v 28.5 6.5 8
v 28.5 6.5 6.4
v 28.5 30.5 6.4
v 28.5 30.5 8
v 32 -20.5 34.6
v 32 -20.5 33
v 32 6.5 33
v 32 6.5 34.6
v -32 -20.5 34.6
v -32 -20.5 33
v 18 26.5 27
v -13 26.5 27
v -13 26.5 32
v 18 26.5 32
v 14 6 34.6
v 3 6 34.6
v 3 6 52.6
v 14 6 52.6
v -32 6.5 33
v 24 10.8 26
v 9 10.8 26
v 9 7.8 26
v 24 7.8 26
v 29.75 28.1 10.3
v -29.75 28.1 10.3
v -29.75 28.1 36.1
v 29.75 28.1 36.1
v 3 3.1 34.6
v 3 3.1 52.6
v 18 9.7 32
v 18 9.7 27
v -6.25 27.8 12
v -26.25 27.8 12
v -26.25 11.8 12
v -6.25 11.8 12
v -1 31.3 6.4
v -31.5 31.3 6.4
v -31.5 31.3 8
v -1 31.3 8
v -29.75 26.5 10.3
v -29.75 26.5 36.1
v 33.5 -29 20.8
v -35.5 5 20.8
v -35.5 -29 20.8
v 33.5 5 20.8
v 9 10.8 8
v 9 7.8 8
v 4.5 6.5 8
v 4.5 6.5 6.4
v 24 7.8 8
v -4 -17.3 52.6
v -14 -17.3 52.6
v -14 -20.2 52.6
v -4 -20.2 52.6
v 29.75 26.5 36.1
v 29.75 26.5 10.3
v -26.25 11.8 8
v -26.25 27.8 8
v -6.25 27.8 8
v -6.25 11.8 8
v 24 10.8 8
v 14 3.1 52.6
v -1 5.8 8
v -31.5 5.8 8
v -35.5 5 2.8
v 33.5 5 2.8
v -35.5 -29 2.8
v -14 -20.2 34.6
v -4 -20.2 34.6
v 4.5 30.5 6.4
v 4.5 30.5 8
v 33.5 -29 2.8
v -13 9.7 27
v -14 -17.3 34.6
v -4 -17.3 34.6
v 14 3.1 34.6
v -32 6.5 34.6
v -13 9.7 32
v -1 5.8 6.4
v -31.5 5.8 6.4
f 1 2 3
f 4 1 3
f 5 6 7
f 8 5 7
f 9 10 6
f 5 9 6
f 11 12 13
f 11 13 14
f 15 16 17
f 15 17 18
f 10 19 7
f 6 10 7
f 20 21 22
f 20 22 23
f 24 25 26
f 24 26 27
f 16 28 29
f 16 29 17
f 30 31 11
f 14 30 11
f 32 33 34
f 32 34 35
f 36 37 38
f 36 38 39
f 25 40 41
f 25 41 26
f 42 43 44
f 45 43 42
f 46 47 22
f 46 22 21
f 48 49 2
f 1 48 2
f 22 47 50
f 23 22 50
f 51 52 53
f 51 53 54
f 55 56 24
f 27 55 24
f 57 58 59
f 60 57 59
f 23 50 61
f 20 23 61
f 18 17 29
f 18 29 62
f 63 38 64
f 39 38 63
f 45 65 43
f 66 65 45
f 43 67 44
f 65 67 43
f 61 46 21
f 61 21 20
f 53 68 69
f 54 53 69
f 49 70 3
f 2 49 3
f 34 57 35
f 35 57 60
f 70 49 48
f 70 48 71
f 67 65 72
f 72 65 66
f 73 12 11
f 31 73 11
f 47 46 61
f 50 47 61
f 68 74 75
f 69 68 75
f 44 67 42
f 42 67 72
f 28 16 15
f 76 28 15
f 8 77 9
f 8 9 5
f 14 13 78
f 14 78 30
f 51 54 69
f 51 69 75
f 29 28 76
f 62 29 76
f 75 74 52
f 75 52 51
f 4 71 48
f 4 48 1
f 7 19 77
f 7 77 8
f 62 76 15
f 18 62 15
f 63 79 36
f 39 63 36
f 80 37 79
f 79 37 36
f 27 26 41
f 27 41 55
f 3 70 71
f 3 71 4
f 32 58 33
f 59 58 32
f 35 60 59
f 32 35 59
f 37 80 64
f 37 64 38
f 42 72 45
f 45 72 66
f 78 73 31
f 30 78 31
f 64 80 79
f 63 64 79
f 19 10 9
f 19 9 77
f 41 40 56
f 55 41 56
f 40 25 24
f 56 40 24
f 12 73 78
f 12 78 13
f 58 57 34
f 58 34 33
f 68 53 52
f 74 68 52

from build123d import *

# Parameters (mm, degrees)
AA_START                                   = 2.8
AA_HOLDER_69_X_34_X_18_PROFILE_W           = 69
AA_HOLDER_69_X_34_X_18_PROFILE_H           = 34
AA_HOLDER_69_X_34_X_18_DEPTH               = 18
YBX_START                                  = 6.4
YBX_BOARD_24_X_24_PROFILE_W                = 24
YBX_BOARD_24_X_24_PROFILE_H                = 24
YBX_BOARD_24_X_24_DEPTH                    = 1.6
YBX_START_2                                = 8
YBX_JUMPER_ENVELOPE_PROFILE_W              = 15
YBX_JUMPER_ENVELOPE_PROFILE_H              = 3
YBX_JUMPER_ENVELOPE_DEPTH                  = 18
GNSS_START                                 = 6.4
GNSS_BOARD_30_5_X_25_5_PROFILE_W           = 30.5
GNSS_BOARD_30_5_X_25_5_PROFILE_H           = 25.5
GNSS_BOARD_30_5_X_25_5_DEPTH               = 1.6
GNSS_START_2                               = 8
GNSS_PATCH_ALLOWANCE_ONLY_PROFILE_W        = 20
GNSS_PATCH_ALLOWANCE_ONLY_PROFILE_H        = 16
GNSS_PATCH_ALLOWANCE_ONLY_DEPTH            = 4
POWER_START                                = 10.3
POWER_BOARD_59_5_X_25_8_PROFILE_W          = 59.5
POWER_BOARD_59_5_X_25_8_PROFILE_H          = 1.6
POWER_BOARD_59_5_X_25_8_DEPTH              = 25.8
POWER_START_2                              = 27
POWER_HORIZONTAL_CONNECTOR_ENVELOPE_PROF_W = 31
POWER_HORIZONTAL_CONNECTOR_ENVELOPE_PROF_H = 16.8
POWER_HORIZONTAL_CONNECTOR_ENVELOPE_DEPTH  = 5
EORA_START                                 = 33
EORA_BOARD_64_X_27_PROFILE_W               = 64
EORA_BOARD_64_X_27_PROFILE_H               = 27
EORA_BOARD_64_X_27_DEPTH                   = 1.6
EORA_START_2                               = 34.6
EORA_UPPER_CONNECTOR_ENVELOPE_A_PROFILE_W  = 10
EORA_UPPER_CONNECTOR_ENVELOPE_A_PROFILE_H  = 2.9
EORA_UPPER_CONNECTOR_ENVELOPE_A_DEPTH      = 18
EORA_UPPER_CONNECTOR_ENVELOPE_B_PROFILE_W  = 11
EORA_UPPER_CONNECTOR_ENVELOPE_B_PROFILE_H  = 2.9
EORA_UPPER_CONNECTOR_ENVELOPE_B_DEPTH      = 18


with BuildPart() as part:
    # AA holder 69 x 34 x 18 profile → AA holder 69 x 34 x 18 (new body)
    with BuildSketch(Plane.XY.offset(AA_START)):
        with Locations((-1, -12)):
            Rectangle(AA_HOLDER_69_X_34_X_18_PROFILE_W, AA_HOLDER_69_X_34_X_18_PROFILE_H)
    extrude(amount=AA_HOLDER_69_X_34_X_18_DEPTH)


with BuildPart() as body_2:
    # YBX board 24 x 24 profile → YBX board 24 x 24 (new body)
    with BuildSketch(Plane.XY.offset(YBX_START)):
        with Locations((16.5, 18.5)):
            Rectangle(YBX_BOARD_24_X_24_PROFILE_W, YBX_BOARD_24_X_24_PROFILE_H)
    extrude(amount=YBX_BOARD_24_X_24_DEPTH)


with BuildPart() as body_3:
    # YBX jumper envelope profile → YBX jumper envelope (new body)
    with BuildSketch(Plane.XY.offset(YBX_START_2)):
        with Locations((16.5, 9.3)):
            Rectangle(YBX_JUMPER_ENVELOPE_PROFILE_W, YBX_JUMPER_ENVELOPE_PROFILE_H)
    extrude(amount=YBX_JUMPER_ENVELOPE_DEPTH)


with BuildPart() as body_4:
    # GNSS board 30.5 x 25.5 profile → GNSS board 30.5 x 25.5 (new body)
    with BuildSketch(Plane.XY.offset(GNSS_START)):
        with Locations((-16.25, 18.55)):
            Rectangle(GNSS_BOARD_30_5_X_25_5_PROFILE_W, GNSS_BOARD_30_5_X_25_5_PROFILE_H)
    extrude(amount=GNSS_BOARD_30_5_X_25_5_DEPTH)


with BuildPart() as body_5:
    # GNSS patch allowance only profile → GNSS patch allowance only (new body)
    with BuildSketch(Plane.XY.offset(GNSS_START_2)):
        with Locations((-16.25, 19.8)):
            Rectangle(GNSS_PATCH_ALLOWANCE_ONLY_PROFILE_W, GNSS_PATCH_ALLOWANCE_ONLY_PROFILE_H)
    extrude(amount=GNSS_PATCH_ALLOWANCE_ONLY_DEPTH)


with BuildPart() as body_6:
    # Power board 59.5 x 25.8 profile → Power board 59.5 x 25.8 (new body)
    with BuildSketch(Plane.XY.offset(POWER_START)):
        with Locations((0, 27.3)):
            Rectangle(POWER_BOARD_59_5_X_25_8_PROFILE_W, POWER_BOARD_59_5_X_25_8_PROFILE_H)
    extrude(amount=POWER_BOARD_59_5_X_25_8_DEPTH)


with BuildPart() as body_7:
    # Power horizontal connector envelope profile → Power horizontal connector envelope (new body)
    with BuildSketch(Plane.XY.offset(POWER_START_2)):
        with Locations((2.5, 18.1)):
            Rectangle(POWER_HORIZONTAL_CONNECTOR_ENVELOPE_PROF_W, POWER_HORIZONTAL_CONNECTOR_ENVELOPE_PROF_H)
    extrude(amount=POWER_HORIZONTAL_CONNECTOR_ENVELOPE_DEPTH)


with BuildPart() as body_8:
    # EoRa board 64 x 27 profile → EoRa board 64 x 27 (new body)
    with BuildSketch(Plane.XY.offset(EORA_START)):
        with Locations((0, -7)):
            Rectangle(EORA_BOARD_64_X_27_PROFILE_W, EORA_BOARD_64_X_27_PROFILE_H)
    extrude(amount=EORA_BOARD_64_X_27_DEPTH)


with BuildPart() as body_9:
    # EoRa upper connector envelope A profile → EoRa upper connector envelope A (new body)
    with BuildSketch(Plane.XY.offset(EORA_START_2)):
        with Locations((-9, -18.75)):
            Rectangle(EORA_UPPER_CONNECTOR_ENVELOPE_A_PROFILE_W, EORA_UPPER_CONNECTOR_ENVELOPE_A_PROFILE_H)
    extrude(amount=EORA_UPPER_CONNECTOR_ENVELOPE_A_DEPTH)


with BuildPart() as body_10:
    # EoRa upper connector envelope B profile → EoRa upper connector envelope B (new body)
    with BuildSketch(Plane.XY.offset(EORA_START_2)):
        with Locations((8.5, 4.55)):
            Rectangle(EORA_UPPER_CONNECTOR_ENVELOPE_B_PROFILE_W, EORA_UPPER_CONNECTOR_ENVELOPE_B_PROFILE_H)
    extrude(amount=EORA_UPPER_CONNECTOR_ENVELOPE_B_DEPTH)


solid = Compound([part.part, body_2.part, body_3.part, body_4.part, body_5.part, body_6.part, body_7.part, body_8.part, body_9.part, body_10.part])
